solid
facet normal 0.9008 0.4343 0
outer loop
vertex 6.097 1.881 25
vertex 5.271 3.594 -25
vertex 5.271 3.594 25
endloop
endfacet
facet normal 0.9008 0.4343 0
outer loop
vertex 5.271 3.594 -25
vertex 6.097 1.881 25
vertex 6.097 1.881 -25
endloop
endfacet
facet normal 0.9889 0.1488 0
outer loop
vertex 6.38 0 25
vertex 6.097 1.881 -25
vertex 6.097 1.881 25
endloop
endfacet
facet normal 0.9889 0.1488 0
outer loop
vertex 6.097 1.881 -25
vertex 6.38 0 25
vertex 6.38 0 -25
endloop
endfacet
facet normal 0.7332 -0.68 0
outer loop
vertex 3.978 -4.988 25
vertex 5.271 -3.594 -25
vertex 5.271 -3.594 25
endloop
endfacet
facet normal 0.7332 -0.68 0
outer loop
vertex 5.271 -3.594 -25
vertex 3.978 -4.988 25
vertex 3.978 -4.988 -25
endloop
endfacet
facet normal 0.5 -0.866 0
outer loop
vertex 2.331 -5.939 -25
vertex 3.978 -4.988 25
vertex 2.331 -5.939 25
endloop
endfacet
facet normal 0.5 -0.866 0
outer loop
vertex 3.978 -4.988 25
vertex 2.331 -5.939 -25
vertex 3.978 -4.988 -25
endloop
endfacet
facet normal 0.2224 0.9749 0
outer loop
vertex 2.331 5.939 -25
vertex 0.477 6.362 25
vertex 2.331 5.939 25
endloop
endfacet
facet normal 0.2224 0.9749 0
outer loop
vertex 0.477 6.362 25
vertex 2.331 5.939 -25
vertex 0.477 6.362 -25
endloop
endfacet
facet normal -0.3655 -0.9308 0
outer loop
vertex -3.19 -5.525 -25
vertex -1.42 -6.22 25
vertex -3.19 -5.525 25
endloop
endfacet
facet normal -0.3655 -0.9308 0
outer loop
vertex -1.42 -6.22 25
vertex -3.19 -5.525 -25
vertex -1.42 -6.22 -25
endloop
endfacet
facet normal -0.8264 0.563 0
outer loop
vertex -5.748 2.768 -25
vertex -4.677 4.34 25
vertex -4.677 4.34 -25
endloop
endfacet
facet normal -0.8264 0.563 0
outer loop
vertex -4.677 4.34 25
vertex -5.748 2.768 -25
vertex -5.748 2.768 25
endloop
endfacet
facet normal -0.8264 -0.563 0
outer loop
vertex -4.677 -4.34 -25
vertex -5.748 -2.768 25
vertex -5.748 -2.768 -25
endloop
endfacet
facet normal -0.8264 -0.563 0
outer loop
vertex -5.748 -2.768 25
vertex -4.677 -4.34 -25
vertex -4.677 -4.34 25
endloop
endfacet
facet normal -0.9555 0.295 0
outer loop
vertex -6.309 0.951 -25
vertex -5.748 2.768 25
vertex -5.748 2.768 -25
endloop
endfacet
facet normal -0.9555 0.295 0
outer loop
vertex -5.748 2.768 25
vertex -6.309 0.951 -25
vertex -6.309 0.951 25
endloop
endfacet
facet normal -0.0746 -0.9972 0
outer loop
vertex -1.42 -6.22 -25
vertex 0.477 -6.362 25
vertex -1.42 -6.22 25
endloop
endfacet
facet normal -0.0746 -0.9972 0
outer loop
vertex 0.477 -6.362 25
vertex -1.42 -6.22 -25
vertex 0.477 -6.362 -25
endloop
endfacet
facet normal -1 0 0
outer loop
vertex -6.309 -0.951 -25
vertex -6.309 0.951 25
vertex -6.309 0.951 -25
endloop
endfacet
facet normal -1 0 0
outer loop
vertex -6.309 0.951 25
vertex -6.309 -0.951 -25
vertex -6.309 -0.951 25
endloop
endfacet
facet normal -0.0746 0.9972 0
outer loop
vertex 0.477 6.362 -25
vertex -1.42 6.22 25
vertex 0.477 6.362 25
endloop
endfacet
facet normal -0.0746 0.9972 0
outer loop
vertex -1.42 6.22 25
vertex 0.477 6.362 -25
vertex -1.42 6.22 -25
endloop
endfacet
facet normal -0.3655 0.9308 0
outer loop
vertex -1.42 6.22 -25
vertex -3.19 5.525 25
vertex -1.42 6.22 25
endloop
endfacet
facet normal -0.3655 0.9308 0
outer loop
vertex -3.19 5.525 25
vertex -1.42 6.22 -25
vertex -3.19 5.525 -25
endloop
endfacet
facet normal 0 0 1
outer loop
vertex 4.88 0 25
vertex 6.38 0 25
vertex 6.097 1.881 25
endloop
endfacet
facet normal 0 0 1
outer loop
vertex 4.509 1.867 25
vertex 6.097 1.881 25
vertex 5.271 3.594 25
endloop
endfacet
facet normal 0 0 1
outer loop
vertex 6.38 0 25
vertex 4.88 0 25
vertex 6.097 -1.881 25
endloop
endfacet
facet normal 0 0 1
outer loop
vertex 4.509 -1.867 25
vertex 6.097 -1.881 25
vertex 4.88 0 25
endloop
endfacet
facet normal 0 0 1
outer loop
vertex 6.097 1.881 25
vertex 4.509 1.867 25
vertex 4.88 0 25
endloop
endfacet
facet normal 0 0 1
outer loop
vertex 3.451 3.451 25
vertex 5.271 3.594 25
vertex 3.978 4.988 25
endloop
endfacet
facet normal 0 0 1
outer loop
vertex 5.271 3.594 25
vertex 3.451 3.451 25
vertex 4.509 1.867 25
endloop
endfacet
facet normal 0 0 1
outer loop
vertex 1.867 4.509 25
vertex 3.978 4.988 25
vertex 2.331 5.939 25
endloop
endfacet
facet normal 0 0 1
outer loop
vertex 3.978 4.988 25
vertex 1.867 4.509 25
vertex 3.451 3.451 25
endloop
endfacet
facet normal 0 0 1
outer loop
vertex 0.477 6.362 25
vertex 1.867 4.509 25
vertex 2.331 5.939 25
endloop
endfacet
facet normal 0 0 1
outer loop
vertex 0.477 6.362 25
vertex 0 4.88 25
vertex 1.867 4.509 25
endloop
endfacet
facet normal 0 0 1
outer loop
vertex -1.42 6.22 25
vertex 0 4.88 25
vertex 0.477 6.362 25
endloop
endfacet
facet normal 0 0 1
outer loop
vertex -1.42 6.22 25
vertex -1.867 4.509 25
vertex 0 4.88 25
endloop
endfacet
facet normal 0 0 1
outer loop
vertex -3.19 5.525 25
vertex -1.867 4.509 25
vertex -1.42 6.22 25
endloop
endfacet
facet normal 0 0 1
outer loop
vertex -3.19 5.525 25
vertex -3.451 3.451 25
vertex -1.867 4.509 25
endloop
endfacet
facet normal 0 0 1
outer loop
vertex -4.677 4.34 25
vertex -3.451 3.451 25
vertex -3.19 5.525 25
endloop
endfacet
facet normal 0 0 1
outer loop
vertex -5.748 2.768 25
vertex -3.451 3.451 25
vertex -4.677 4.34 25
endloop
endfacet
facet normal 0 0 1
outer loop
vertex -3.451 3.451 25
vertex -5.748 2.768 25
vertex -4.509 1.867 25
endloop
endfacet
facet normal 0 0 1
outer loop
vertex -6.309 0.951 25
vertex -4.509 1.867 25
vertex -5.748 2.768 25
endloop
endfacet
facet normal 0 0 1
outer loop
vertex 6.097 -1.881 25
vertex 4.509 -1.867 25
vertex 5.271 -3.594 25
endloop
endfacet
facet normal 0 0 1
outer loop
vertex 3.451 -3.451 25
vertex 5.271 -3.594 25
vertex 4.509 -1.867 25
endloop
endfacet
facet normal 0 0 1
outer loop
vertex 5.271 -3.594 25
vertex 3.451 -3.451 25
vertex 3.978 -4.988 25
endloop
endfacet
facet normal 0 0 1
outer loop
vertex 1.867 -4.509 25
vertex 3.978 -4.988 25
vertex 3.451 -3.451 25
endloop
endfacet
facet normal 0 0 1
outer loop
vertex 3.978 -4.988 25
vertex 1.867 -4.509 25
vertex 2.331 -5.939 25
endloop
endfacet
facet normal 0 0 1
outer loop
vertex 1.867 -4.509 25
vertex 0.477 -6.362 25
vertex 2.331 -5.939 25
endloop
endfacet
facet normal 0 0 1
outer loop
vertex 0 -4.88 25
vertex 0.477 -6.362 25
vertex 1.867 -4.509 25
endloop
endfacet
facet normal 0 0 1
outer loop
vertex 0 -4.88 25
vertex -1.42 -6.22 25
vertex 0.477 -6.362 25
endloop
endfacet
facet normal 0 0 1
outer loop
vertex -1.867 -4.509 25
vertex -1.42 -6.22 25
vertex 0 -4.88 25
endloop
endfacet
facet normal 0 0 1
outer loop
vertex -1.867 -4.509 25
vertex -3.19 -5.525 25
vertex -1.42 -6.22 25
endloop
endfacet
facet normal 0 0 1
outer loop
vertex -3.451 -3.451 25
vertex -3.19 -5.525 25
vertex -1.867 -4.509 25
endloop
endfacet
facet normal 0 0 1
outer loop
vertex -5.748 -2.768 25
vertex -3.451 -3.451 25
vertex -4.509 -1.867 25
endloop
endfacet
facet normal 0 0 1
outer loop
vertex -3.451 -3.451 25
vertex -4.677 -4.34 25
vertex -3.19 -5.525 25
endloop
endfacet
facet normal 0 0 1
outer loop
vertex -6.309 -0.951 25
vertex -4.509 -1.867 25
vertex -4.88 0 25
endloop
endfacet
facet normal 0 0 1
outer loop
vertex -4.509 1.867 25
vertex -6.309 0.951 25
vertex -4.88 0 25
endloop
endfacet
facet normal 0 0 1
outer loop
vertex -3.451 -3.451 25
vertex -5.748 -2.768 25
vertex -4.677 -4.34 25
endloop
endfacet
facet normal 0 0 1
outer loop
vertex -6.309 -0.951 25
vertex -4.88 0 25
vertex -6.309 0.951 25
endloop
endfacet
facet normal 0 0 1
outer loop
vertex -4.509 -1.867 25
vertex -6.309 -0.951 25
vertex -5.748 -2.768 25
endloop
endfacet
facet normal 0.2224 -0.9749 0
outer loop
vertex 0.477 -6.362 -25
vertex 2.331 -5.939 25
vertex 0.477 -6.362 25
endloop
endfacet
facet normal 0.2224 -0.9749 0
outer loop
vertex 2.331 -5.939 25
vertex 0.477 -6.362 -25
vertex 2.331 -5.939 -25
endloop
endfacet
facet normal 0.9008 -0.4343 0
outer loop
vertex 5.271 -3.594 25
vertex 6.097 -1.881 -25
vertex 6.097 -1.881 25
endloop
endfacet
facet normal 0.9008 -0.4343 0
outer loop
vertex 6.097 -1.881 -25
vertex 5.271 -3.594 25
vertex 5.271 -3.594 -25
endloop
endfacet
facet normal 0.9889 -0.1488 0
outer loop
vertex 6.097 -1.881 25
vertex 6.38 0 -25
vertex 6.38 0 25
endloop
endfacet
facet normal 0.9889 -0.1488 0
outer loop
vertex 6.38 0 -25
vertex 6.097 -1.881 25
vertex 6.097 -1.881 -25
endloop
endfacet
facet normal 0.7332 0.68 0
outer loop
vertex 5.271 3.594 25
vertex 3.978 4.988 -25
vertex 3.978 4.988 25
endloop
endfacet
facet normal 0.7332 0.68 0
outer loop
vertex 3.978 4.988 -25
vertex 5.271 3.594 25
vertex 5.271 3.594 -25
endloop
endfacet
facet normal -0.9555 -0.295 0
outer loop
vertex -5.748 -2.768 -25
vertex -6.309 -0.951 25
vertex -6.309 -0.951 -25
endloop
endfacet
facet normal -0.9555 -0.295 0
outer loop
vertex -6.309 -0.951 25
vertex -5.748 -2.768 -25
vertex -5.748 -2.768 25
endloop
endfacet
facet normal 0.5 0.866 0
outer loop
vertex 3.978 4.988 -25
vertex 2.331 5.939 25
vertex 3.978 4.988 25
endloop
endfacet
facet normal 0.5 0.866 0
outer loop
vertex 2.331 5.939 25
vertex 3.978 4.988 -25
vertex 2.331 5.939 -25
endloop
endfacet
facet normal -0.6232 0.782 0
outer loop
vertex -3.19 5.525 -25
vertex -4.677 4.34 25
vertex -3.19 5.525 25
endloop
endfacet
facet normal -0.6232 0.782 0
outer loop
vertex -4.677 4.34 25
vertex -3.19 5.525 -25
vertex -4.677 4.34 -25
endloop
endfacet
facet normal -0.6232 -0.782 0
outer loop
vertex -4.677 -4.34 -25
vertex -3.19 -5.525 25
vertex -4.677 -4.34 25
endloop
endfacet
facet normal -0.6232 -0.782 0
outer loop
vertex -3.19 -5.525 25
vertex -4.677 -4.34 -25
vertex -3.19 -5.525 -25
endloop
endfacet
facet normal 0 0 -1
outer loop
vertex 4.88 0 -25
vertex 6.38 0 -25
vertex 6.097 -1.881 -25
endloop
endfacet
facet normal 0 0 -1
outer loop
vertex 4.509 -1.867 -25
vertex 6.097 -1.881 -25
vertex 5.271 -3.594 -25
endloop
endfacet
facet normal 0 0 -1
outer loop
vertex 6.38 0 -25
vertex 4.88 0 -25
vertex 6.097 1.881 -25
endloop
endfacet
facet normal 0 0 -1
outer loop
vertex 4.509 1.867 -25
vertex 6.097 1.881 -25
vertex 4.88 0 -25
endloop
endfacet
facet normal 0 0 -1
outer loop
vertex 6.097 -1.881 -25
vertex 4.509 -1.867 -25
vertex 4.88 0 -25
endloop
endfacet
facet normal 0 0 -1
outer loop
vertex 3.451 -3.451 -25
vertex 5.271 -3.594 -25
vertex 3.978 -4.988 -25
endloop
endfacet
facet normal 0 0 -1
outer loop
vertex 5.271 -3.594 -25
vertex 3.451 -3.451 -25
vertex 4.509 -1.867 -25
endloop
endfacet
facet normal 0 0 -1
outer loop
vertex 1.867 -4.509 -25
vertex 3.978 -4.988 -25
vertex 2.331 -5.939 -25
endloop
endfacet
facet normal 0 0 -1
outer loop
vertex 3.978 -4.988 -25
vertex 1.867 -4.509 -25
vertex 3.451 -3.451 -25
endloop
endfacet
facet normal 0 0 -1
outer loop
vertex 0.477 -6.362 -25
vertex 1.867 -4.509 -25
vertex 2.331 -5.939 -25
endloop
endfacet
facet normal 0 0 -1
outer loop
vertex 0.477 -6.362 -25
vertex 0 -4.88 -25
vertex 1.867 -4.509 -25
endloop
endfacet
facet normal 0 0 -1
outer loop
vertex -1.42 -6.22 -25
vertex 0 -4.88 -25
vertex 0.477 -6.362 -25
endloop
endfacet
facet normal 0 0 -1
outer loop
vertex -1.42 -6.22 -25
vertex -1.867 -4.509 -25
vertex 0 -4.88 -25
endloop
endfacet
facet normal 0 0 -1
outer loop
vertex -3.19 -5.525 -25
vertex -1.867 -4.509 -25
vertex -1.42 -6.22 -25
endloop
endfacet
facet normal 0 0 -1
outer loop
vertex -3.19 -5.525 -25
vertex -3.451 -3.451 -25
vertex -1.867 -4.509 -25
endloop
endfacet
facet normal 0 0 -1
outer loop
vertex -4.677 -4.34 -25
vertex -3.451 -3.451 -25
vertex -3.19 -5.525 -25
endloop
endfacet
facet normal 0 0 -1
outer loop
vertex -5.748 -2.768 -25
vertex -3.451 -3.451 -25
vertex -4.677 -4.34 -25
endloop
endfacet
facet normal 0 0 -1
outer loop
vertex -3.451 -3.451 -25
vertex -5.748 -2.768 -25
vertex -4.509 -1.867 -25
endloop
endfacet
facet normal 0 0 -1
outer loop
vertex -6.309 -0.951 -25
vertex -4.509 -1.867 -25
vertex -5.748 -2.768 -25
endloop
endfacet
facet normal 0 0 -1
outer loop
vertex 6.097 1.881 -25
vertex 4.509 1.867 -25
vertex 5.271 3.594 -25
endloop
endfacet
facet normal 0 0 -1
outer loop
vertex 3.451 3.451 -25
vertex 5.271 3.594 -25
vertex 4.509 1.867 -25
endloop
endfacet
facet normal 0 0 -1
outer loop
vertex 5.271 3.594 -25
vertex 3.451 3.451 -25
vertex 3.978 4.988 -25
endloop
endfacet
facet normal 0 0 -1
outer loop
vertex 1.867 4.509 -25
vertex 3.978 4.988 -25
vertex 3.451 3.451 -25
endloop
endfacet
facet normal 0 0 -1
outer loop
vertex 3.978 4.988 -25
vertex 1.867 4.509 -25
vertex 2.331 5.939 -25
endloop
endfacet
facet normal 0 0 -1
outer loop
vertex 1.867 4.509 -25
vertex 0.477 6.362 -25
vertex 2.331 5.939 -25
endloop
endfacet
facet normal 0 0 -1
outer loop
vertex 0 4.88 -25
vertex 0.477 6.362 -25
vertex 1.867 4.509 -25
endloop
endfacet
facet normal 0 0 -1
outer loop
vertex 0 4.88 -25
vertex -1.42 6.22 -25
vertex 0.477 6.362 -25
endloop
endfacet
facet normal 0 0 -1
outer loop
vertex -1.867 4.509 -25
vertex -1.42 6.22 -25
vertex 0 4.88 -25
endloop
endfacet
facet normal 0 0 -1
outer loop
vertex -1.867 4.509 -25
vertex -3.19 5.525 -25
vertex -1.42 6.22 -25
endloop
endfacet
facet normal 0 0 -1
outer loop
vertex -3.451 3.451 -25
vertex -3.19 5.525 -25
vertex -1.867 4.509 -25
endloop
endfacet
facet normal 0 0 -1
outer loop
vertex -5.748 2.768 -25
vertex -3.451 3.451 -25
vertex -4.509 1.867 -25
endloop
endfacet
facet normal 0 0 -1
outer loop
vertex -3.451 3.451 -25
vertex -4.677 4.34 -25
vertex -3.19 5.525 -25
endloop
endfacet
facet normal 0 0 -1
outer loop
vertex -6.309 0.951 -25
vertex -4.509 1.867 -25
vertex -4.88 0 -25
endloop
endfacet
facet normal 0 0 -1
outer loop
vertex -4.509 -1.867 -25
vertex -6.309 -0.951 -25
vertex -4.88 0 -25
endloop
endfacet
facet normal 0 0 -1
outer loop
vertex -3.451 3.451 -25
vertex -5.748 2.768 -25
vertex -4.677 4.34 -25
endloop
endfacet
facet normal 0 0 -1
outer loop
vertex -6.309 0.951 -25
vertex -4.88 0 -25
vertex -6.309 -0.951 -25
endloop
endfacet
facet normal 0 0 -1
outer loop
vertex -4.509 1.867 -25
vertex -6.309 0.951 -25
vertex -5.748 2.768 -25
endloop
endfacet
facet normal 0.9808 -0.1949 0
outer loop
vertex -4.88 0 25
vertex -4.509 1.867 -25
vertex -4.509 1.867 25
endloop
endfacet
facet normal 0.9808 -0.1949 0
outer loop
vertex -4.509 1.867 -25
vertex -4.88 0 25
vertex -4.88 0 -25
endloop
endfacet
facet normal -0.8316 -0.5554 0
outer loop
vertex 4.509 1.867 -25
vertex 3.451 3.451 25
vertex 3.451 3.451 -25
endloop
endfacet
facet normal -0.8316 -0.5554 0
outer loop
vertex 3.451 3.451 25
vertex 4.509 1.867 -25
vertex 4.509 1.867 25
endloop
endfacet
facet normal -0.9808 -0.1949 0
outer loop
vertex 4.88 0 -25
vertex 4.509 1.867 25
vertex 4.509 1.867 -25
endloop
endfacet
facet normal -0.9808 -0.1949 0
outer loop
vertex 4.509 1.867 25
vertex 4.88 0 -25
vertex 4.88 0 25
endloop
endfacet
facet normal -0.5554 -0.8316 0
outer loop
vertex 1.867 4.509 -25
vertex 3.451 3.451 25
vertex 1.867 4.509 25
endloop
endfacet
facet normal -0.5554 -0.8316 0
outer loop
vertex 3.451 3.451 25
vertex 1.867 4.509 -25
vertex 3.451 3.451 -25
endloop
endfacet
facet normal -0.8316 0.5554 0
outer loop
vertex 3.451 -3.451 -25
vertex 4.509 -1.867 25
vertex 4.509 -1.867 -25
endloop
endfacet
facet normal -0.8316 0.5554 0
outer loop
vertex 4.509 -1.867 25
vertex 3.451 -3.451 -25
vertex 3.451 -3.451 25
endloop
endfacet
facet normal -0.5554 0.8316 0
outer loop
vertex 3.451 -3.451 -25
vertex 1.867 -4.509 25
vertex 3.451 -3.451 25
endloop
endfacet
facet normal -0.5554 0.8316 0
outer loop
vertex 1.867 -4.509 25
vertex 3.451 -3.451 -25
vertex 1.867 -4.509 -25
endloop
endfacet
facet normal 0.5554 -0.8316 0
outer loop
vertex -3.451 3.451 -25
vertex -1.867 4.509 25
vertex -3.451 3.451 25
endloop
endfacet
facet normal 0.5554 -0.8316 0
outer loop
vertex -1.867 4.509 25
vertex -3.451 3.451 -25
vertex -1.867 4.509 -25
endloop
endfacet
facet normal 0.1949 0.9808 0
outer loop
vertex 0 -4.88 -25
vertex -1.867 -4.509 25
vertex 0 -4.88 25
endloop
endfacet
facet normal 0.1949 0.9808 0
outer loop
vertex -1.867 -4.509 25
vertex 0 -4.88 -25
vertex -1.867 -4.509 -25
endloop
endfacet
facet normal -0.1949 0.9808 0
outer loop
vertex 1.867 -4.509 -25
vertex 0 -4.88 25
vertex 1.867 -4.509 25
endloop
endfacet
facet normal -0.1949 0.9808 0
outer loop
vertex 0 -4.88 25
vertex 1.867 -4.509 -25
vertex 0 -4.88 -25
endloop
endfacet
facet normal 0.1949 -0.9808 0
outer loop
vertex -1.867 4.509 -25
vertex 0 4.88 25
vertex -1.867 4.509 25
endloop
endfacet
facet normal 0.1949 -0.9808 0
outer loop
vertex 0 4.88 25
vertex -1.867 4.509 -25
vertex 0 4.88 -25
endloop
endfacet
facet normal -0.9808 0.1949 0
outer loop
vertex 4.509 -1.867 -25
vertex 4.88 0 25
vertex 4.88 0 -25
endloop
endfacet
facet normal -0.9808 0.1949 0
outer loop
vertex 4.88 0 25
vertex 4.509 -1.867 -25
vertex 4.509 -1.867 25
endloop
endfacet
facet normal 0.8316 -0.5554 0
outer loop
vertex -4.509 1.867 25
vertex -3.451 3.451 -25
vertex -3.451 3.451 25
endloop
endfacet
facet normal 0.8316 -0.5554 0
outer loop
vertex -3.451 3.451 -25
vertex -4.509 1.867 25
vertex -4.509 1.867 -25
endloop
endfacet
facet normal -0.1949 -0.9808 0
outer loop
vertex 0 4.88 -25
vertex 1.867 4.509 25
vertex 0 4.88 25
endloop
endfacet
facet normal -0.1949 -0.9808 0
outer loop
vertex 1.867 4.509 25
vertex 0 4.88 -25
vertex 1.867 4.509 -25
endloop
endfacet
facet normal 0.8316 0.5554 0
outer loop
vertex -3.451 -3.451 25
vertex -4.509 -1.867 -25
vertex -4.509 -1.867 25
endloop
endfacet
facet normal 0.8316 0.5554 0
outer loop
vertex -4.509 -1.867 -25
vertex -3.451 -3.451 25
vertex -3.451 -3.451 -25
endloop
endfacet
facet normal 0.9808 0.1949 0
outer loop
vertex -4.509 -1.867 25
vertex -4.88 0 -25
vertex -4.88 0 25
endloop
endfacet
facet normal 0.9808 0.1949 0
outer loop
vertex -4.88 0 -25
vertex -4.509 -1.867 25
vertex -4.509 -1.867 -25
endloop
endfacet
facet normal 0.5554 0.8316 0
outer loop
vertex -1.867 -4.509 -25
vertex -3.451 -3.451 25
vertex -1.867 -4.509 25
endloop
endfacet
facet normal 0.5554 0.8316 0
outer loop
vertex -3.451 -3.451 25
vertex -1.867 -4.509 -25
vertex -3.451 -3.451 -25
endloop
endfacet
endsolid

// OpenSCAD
height = 50;
radius = 4.88;
difference () {
     cylinder (h=height, r=radius+1.5, center=true);
     cylinder (h=height+1, r=radius, center=true);
     }

//translate([-2.5,4.25,0]) rotate(45) cube([7,2,height], center=true);
